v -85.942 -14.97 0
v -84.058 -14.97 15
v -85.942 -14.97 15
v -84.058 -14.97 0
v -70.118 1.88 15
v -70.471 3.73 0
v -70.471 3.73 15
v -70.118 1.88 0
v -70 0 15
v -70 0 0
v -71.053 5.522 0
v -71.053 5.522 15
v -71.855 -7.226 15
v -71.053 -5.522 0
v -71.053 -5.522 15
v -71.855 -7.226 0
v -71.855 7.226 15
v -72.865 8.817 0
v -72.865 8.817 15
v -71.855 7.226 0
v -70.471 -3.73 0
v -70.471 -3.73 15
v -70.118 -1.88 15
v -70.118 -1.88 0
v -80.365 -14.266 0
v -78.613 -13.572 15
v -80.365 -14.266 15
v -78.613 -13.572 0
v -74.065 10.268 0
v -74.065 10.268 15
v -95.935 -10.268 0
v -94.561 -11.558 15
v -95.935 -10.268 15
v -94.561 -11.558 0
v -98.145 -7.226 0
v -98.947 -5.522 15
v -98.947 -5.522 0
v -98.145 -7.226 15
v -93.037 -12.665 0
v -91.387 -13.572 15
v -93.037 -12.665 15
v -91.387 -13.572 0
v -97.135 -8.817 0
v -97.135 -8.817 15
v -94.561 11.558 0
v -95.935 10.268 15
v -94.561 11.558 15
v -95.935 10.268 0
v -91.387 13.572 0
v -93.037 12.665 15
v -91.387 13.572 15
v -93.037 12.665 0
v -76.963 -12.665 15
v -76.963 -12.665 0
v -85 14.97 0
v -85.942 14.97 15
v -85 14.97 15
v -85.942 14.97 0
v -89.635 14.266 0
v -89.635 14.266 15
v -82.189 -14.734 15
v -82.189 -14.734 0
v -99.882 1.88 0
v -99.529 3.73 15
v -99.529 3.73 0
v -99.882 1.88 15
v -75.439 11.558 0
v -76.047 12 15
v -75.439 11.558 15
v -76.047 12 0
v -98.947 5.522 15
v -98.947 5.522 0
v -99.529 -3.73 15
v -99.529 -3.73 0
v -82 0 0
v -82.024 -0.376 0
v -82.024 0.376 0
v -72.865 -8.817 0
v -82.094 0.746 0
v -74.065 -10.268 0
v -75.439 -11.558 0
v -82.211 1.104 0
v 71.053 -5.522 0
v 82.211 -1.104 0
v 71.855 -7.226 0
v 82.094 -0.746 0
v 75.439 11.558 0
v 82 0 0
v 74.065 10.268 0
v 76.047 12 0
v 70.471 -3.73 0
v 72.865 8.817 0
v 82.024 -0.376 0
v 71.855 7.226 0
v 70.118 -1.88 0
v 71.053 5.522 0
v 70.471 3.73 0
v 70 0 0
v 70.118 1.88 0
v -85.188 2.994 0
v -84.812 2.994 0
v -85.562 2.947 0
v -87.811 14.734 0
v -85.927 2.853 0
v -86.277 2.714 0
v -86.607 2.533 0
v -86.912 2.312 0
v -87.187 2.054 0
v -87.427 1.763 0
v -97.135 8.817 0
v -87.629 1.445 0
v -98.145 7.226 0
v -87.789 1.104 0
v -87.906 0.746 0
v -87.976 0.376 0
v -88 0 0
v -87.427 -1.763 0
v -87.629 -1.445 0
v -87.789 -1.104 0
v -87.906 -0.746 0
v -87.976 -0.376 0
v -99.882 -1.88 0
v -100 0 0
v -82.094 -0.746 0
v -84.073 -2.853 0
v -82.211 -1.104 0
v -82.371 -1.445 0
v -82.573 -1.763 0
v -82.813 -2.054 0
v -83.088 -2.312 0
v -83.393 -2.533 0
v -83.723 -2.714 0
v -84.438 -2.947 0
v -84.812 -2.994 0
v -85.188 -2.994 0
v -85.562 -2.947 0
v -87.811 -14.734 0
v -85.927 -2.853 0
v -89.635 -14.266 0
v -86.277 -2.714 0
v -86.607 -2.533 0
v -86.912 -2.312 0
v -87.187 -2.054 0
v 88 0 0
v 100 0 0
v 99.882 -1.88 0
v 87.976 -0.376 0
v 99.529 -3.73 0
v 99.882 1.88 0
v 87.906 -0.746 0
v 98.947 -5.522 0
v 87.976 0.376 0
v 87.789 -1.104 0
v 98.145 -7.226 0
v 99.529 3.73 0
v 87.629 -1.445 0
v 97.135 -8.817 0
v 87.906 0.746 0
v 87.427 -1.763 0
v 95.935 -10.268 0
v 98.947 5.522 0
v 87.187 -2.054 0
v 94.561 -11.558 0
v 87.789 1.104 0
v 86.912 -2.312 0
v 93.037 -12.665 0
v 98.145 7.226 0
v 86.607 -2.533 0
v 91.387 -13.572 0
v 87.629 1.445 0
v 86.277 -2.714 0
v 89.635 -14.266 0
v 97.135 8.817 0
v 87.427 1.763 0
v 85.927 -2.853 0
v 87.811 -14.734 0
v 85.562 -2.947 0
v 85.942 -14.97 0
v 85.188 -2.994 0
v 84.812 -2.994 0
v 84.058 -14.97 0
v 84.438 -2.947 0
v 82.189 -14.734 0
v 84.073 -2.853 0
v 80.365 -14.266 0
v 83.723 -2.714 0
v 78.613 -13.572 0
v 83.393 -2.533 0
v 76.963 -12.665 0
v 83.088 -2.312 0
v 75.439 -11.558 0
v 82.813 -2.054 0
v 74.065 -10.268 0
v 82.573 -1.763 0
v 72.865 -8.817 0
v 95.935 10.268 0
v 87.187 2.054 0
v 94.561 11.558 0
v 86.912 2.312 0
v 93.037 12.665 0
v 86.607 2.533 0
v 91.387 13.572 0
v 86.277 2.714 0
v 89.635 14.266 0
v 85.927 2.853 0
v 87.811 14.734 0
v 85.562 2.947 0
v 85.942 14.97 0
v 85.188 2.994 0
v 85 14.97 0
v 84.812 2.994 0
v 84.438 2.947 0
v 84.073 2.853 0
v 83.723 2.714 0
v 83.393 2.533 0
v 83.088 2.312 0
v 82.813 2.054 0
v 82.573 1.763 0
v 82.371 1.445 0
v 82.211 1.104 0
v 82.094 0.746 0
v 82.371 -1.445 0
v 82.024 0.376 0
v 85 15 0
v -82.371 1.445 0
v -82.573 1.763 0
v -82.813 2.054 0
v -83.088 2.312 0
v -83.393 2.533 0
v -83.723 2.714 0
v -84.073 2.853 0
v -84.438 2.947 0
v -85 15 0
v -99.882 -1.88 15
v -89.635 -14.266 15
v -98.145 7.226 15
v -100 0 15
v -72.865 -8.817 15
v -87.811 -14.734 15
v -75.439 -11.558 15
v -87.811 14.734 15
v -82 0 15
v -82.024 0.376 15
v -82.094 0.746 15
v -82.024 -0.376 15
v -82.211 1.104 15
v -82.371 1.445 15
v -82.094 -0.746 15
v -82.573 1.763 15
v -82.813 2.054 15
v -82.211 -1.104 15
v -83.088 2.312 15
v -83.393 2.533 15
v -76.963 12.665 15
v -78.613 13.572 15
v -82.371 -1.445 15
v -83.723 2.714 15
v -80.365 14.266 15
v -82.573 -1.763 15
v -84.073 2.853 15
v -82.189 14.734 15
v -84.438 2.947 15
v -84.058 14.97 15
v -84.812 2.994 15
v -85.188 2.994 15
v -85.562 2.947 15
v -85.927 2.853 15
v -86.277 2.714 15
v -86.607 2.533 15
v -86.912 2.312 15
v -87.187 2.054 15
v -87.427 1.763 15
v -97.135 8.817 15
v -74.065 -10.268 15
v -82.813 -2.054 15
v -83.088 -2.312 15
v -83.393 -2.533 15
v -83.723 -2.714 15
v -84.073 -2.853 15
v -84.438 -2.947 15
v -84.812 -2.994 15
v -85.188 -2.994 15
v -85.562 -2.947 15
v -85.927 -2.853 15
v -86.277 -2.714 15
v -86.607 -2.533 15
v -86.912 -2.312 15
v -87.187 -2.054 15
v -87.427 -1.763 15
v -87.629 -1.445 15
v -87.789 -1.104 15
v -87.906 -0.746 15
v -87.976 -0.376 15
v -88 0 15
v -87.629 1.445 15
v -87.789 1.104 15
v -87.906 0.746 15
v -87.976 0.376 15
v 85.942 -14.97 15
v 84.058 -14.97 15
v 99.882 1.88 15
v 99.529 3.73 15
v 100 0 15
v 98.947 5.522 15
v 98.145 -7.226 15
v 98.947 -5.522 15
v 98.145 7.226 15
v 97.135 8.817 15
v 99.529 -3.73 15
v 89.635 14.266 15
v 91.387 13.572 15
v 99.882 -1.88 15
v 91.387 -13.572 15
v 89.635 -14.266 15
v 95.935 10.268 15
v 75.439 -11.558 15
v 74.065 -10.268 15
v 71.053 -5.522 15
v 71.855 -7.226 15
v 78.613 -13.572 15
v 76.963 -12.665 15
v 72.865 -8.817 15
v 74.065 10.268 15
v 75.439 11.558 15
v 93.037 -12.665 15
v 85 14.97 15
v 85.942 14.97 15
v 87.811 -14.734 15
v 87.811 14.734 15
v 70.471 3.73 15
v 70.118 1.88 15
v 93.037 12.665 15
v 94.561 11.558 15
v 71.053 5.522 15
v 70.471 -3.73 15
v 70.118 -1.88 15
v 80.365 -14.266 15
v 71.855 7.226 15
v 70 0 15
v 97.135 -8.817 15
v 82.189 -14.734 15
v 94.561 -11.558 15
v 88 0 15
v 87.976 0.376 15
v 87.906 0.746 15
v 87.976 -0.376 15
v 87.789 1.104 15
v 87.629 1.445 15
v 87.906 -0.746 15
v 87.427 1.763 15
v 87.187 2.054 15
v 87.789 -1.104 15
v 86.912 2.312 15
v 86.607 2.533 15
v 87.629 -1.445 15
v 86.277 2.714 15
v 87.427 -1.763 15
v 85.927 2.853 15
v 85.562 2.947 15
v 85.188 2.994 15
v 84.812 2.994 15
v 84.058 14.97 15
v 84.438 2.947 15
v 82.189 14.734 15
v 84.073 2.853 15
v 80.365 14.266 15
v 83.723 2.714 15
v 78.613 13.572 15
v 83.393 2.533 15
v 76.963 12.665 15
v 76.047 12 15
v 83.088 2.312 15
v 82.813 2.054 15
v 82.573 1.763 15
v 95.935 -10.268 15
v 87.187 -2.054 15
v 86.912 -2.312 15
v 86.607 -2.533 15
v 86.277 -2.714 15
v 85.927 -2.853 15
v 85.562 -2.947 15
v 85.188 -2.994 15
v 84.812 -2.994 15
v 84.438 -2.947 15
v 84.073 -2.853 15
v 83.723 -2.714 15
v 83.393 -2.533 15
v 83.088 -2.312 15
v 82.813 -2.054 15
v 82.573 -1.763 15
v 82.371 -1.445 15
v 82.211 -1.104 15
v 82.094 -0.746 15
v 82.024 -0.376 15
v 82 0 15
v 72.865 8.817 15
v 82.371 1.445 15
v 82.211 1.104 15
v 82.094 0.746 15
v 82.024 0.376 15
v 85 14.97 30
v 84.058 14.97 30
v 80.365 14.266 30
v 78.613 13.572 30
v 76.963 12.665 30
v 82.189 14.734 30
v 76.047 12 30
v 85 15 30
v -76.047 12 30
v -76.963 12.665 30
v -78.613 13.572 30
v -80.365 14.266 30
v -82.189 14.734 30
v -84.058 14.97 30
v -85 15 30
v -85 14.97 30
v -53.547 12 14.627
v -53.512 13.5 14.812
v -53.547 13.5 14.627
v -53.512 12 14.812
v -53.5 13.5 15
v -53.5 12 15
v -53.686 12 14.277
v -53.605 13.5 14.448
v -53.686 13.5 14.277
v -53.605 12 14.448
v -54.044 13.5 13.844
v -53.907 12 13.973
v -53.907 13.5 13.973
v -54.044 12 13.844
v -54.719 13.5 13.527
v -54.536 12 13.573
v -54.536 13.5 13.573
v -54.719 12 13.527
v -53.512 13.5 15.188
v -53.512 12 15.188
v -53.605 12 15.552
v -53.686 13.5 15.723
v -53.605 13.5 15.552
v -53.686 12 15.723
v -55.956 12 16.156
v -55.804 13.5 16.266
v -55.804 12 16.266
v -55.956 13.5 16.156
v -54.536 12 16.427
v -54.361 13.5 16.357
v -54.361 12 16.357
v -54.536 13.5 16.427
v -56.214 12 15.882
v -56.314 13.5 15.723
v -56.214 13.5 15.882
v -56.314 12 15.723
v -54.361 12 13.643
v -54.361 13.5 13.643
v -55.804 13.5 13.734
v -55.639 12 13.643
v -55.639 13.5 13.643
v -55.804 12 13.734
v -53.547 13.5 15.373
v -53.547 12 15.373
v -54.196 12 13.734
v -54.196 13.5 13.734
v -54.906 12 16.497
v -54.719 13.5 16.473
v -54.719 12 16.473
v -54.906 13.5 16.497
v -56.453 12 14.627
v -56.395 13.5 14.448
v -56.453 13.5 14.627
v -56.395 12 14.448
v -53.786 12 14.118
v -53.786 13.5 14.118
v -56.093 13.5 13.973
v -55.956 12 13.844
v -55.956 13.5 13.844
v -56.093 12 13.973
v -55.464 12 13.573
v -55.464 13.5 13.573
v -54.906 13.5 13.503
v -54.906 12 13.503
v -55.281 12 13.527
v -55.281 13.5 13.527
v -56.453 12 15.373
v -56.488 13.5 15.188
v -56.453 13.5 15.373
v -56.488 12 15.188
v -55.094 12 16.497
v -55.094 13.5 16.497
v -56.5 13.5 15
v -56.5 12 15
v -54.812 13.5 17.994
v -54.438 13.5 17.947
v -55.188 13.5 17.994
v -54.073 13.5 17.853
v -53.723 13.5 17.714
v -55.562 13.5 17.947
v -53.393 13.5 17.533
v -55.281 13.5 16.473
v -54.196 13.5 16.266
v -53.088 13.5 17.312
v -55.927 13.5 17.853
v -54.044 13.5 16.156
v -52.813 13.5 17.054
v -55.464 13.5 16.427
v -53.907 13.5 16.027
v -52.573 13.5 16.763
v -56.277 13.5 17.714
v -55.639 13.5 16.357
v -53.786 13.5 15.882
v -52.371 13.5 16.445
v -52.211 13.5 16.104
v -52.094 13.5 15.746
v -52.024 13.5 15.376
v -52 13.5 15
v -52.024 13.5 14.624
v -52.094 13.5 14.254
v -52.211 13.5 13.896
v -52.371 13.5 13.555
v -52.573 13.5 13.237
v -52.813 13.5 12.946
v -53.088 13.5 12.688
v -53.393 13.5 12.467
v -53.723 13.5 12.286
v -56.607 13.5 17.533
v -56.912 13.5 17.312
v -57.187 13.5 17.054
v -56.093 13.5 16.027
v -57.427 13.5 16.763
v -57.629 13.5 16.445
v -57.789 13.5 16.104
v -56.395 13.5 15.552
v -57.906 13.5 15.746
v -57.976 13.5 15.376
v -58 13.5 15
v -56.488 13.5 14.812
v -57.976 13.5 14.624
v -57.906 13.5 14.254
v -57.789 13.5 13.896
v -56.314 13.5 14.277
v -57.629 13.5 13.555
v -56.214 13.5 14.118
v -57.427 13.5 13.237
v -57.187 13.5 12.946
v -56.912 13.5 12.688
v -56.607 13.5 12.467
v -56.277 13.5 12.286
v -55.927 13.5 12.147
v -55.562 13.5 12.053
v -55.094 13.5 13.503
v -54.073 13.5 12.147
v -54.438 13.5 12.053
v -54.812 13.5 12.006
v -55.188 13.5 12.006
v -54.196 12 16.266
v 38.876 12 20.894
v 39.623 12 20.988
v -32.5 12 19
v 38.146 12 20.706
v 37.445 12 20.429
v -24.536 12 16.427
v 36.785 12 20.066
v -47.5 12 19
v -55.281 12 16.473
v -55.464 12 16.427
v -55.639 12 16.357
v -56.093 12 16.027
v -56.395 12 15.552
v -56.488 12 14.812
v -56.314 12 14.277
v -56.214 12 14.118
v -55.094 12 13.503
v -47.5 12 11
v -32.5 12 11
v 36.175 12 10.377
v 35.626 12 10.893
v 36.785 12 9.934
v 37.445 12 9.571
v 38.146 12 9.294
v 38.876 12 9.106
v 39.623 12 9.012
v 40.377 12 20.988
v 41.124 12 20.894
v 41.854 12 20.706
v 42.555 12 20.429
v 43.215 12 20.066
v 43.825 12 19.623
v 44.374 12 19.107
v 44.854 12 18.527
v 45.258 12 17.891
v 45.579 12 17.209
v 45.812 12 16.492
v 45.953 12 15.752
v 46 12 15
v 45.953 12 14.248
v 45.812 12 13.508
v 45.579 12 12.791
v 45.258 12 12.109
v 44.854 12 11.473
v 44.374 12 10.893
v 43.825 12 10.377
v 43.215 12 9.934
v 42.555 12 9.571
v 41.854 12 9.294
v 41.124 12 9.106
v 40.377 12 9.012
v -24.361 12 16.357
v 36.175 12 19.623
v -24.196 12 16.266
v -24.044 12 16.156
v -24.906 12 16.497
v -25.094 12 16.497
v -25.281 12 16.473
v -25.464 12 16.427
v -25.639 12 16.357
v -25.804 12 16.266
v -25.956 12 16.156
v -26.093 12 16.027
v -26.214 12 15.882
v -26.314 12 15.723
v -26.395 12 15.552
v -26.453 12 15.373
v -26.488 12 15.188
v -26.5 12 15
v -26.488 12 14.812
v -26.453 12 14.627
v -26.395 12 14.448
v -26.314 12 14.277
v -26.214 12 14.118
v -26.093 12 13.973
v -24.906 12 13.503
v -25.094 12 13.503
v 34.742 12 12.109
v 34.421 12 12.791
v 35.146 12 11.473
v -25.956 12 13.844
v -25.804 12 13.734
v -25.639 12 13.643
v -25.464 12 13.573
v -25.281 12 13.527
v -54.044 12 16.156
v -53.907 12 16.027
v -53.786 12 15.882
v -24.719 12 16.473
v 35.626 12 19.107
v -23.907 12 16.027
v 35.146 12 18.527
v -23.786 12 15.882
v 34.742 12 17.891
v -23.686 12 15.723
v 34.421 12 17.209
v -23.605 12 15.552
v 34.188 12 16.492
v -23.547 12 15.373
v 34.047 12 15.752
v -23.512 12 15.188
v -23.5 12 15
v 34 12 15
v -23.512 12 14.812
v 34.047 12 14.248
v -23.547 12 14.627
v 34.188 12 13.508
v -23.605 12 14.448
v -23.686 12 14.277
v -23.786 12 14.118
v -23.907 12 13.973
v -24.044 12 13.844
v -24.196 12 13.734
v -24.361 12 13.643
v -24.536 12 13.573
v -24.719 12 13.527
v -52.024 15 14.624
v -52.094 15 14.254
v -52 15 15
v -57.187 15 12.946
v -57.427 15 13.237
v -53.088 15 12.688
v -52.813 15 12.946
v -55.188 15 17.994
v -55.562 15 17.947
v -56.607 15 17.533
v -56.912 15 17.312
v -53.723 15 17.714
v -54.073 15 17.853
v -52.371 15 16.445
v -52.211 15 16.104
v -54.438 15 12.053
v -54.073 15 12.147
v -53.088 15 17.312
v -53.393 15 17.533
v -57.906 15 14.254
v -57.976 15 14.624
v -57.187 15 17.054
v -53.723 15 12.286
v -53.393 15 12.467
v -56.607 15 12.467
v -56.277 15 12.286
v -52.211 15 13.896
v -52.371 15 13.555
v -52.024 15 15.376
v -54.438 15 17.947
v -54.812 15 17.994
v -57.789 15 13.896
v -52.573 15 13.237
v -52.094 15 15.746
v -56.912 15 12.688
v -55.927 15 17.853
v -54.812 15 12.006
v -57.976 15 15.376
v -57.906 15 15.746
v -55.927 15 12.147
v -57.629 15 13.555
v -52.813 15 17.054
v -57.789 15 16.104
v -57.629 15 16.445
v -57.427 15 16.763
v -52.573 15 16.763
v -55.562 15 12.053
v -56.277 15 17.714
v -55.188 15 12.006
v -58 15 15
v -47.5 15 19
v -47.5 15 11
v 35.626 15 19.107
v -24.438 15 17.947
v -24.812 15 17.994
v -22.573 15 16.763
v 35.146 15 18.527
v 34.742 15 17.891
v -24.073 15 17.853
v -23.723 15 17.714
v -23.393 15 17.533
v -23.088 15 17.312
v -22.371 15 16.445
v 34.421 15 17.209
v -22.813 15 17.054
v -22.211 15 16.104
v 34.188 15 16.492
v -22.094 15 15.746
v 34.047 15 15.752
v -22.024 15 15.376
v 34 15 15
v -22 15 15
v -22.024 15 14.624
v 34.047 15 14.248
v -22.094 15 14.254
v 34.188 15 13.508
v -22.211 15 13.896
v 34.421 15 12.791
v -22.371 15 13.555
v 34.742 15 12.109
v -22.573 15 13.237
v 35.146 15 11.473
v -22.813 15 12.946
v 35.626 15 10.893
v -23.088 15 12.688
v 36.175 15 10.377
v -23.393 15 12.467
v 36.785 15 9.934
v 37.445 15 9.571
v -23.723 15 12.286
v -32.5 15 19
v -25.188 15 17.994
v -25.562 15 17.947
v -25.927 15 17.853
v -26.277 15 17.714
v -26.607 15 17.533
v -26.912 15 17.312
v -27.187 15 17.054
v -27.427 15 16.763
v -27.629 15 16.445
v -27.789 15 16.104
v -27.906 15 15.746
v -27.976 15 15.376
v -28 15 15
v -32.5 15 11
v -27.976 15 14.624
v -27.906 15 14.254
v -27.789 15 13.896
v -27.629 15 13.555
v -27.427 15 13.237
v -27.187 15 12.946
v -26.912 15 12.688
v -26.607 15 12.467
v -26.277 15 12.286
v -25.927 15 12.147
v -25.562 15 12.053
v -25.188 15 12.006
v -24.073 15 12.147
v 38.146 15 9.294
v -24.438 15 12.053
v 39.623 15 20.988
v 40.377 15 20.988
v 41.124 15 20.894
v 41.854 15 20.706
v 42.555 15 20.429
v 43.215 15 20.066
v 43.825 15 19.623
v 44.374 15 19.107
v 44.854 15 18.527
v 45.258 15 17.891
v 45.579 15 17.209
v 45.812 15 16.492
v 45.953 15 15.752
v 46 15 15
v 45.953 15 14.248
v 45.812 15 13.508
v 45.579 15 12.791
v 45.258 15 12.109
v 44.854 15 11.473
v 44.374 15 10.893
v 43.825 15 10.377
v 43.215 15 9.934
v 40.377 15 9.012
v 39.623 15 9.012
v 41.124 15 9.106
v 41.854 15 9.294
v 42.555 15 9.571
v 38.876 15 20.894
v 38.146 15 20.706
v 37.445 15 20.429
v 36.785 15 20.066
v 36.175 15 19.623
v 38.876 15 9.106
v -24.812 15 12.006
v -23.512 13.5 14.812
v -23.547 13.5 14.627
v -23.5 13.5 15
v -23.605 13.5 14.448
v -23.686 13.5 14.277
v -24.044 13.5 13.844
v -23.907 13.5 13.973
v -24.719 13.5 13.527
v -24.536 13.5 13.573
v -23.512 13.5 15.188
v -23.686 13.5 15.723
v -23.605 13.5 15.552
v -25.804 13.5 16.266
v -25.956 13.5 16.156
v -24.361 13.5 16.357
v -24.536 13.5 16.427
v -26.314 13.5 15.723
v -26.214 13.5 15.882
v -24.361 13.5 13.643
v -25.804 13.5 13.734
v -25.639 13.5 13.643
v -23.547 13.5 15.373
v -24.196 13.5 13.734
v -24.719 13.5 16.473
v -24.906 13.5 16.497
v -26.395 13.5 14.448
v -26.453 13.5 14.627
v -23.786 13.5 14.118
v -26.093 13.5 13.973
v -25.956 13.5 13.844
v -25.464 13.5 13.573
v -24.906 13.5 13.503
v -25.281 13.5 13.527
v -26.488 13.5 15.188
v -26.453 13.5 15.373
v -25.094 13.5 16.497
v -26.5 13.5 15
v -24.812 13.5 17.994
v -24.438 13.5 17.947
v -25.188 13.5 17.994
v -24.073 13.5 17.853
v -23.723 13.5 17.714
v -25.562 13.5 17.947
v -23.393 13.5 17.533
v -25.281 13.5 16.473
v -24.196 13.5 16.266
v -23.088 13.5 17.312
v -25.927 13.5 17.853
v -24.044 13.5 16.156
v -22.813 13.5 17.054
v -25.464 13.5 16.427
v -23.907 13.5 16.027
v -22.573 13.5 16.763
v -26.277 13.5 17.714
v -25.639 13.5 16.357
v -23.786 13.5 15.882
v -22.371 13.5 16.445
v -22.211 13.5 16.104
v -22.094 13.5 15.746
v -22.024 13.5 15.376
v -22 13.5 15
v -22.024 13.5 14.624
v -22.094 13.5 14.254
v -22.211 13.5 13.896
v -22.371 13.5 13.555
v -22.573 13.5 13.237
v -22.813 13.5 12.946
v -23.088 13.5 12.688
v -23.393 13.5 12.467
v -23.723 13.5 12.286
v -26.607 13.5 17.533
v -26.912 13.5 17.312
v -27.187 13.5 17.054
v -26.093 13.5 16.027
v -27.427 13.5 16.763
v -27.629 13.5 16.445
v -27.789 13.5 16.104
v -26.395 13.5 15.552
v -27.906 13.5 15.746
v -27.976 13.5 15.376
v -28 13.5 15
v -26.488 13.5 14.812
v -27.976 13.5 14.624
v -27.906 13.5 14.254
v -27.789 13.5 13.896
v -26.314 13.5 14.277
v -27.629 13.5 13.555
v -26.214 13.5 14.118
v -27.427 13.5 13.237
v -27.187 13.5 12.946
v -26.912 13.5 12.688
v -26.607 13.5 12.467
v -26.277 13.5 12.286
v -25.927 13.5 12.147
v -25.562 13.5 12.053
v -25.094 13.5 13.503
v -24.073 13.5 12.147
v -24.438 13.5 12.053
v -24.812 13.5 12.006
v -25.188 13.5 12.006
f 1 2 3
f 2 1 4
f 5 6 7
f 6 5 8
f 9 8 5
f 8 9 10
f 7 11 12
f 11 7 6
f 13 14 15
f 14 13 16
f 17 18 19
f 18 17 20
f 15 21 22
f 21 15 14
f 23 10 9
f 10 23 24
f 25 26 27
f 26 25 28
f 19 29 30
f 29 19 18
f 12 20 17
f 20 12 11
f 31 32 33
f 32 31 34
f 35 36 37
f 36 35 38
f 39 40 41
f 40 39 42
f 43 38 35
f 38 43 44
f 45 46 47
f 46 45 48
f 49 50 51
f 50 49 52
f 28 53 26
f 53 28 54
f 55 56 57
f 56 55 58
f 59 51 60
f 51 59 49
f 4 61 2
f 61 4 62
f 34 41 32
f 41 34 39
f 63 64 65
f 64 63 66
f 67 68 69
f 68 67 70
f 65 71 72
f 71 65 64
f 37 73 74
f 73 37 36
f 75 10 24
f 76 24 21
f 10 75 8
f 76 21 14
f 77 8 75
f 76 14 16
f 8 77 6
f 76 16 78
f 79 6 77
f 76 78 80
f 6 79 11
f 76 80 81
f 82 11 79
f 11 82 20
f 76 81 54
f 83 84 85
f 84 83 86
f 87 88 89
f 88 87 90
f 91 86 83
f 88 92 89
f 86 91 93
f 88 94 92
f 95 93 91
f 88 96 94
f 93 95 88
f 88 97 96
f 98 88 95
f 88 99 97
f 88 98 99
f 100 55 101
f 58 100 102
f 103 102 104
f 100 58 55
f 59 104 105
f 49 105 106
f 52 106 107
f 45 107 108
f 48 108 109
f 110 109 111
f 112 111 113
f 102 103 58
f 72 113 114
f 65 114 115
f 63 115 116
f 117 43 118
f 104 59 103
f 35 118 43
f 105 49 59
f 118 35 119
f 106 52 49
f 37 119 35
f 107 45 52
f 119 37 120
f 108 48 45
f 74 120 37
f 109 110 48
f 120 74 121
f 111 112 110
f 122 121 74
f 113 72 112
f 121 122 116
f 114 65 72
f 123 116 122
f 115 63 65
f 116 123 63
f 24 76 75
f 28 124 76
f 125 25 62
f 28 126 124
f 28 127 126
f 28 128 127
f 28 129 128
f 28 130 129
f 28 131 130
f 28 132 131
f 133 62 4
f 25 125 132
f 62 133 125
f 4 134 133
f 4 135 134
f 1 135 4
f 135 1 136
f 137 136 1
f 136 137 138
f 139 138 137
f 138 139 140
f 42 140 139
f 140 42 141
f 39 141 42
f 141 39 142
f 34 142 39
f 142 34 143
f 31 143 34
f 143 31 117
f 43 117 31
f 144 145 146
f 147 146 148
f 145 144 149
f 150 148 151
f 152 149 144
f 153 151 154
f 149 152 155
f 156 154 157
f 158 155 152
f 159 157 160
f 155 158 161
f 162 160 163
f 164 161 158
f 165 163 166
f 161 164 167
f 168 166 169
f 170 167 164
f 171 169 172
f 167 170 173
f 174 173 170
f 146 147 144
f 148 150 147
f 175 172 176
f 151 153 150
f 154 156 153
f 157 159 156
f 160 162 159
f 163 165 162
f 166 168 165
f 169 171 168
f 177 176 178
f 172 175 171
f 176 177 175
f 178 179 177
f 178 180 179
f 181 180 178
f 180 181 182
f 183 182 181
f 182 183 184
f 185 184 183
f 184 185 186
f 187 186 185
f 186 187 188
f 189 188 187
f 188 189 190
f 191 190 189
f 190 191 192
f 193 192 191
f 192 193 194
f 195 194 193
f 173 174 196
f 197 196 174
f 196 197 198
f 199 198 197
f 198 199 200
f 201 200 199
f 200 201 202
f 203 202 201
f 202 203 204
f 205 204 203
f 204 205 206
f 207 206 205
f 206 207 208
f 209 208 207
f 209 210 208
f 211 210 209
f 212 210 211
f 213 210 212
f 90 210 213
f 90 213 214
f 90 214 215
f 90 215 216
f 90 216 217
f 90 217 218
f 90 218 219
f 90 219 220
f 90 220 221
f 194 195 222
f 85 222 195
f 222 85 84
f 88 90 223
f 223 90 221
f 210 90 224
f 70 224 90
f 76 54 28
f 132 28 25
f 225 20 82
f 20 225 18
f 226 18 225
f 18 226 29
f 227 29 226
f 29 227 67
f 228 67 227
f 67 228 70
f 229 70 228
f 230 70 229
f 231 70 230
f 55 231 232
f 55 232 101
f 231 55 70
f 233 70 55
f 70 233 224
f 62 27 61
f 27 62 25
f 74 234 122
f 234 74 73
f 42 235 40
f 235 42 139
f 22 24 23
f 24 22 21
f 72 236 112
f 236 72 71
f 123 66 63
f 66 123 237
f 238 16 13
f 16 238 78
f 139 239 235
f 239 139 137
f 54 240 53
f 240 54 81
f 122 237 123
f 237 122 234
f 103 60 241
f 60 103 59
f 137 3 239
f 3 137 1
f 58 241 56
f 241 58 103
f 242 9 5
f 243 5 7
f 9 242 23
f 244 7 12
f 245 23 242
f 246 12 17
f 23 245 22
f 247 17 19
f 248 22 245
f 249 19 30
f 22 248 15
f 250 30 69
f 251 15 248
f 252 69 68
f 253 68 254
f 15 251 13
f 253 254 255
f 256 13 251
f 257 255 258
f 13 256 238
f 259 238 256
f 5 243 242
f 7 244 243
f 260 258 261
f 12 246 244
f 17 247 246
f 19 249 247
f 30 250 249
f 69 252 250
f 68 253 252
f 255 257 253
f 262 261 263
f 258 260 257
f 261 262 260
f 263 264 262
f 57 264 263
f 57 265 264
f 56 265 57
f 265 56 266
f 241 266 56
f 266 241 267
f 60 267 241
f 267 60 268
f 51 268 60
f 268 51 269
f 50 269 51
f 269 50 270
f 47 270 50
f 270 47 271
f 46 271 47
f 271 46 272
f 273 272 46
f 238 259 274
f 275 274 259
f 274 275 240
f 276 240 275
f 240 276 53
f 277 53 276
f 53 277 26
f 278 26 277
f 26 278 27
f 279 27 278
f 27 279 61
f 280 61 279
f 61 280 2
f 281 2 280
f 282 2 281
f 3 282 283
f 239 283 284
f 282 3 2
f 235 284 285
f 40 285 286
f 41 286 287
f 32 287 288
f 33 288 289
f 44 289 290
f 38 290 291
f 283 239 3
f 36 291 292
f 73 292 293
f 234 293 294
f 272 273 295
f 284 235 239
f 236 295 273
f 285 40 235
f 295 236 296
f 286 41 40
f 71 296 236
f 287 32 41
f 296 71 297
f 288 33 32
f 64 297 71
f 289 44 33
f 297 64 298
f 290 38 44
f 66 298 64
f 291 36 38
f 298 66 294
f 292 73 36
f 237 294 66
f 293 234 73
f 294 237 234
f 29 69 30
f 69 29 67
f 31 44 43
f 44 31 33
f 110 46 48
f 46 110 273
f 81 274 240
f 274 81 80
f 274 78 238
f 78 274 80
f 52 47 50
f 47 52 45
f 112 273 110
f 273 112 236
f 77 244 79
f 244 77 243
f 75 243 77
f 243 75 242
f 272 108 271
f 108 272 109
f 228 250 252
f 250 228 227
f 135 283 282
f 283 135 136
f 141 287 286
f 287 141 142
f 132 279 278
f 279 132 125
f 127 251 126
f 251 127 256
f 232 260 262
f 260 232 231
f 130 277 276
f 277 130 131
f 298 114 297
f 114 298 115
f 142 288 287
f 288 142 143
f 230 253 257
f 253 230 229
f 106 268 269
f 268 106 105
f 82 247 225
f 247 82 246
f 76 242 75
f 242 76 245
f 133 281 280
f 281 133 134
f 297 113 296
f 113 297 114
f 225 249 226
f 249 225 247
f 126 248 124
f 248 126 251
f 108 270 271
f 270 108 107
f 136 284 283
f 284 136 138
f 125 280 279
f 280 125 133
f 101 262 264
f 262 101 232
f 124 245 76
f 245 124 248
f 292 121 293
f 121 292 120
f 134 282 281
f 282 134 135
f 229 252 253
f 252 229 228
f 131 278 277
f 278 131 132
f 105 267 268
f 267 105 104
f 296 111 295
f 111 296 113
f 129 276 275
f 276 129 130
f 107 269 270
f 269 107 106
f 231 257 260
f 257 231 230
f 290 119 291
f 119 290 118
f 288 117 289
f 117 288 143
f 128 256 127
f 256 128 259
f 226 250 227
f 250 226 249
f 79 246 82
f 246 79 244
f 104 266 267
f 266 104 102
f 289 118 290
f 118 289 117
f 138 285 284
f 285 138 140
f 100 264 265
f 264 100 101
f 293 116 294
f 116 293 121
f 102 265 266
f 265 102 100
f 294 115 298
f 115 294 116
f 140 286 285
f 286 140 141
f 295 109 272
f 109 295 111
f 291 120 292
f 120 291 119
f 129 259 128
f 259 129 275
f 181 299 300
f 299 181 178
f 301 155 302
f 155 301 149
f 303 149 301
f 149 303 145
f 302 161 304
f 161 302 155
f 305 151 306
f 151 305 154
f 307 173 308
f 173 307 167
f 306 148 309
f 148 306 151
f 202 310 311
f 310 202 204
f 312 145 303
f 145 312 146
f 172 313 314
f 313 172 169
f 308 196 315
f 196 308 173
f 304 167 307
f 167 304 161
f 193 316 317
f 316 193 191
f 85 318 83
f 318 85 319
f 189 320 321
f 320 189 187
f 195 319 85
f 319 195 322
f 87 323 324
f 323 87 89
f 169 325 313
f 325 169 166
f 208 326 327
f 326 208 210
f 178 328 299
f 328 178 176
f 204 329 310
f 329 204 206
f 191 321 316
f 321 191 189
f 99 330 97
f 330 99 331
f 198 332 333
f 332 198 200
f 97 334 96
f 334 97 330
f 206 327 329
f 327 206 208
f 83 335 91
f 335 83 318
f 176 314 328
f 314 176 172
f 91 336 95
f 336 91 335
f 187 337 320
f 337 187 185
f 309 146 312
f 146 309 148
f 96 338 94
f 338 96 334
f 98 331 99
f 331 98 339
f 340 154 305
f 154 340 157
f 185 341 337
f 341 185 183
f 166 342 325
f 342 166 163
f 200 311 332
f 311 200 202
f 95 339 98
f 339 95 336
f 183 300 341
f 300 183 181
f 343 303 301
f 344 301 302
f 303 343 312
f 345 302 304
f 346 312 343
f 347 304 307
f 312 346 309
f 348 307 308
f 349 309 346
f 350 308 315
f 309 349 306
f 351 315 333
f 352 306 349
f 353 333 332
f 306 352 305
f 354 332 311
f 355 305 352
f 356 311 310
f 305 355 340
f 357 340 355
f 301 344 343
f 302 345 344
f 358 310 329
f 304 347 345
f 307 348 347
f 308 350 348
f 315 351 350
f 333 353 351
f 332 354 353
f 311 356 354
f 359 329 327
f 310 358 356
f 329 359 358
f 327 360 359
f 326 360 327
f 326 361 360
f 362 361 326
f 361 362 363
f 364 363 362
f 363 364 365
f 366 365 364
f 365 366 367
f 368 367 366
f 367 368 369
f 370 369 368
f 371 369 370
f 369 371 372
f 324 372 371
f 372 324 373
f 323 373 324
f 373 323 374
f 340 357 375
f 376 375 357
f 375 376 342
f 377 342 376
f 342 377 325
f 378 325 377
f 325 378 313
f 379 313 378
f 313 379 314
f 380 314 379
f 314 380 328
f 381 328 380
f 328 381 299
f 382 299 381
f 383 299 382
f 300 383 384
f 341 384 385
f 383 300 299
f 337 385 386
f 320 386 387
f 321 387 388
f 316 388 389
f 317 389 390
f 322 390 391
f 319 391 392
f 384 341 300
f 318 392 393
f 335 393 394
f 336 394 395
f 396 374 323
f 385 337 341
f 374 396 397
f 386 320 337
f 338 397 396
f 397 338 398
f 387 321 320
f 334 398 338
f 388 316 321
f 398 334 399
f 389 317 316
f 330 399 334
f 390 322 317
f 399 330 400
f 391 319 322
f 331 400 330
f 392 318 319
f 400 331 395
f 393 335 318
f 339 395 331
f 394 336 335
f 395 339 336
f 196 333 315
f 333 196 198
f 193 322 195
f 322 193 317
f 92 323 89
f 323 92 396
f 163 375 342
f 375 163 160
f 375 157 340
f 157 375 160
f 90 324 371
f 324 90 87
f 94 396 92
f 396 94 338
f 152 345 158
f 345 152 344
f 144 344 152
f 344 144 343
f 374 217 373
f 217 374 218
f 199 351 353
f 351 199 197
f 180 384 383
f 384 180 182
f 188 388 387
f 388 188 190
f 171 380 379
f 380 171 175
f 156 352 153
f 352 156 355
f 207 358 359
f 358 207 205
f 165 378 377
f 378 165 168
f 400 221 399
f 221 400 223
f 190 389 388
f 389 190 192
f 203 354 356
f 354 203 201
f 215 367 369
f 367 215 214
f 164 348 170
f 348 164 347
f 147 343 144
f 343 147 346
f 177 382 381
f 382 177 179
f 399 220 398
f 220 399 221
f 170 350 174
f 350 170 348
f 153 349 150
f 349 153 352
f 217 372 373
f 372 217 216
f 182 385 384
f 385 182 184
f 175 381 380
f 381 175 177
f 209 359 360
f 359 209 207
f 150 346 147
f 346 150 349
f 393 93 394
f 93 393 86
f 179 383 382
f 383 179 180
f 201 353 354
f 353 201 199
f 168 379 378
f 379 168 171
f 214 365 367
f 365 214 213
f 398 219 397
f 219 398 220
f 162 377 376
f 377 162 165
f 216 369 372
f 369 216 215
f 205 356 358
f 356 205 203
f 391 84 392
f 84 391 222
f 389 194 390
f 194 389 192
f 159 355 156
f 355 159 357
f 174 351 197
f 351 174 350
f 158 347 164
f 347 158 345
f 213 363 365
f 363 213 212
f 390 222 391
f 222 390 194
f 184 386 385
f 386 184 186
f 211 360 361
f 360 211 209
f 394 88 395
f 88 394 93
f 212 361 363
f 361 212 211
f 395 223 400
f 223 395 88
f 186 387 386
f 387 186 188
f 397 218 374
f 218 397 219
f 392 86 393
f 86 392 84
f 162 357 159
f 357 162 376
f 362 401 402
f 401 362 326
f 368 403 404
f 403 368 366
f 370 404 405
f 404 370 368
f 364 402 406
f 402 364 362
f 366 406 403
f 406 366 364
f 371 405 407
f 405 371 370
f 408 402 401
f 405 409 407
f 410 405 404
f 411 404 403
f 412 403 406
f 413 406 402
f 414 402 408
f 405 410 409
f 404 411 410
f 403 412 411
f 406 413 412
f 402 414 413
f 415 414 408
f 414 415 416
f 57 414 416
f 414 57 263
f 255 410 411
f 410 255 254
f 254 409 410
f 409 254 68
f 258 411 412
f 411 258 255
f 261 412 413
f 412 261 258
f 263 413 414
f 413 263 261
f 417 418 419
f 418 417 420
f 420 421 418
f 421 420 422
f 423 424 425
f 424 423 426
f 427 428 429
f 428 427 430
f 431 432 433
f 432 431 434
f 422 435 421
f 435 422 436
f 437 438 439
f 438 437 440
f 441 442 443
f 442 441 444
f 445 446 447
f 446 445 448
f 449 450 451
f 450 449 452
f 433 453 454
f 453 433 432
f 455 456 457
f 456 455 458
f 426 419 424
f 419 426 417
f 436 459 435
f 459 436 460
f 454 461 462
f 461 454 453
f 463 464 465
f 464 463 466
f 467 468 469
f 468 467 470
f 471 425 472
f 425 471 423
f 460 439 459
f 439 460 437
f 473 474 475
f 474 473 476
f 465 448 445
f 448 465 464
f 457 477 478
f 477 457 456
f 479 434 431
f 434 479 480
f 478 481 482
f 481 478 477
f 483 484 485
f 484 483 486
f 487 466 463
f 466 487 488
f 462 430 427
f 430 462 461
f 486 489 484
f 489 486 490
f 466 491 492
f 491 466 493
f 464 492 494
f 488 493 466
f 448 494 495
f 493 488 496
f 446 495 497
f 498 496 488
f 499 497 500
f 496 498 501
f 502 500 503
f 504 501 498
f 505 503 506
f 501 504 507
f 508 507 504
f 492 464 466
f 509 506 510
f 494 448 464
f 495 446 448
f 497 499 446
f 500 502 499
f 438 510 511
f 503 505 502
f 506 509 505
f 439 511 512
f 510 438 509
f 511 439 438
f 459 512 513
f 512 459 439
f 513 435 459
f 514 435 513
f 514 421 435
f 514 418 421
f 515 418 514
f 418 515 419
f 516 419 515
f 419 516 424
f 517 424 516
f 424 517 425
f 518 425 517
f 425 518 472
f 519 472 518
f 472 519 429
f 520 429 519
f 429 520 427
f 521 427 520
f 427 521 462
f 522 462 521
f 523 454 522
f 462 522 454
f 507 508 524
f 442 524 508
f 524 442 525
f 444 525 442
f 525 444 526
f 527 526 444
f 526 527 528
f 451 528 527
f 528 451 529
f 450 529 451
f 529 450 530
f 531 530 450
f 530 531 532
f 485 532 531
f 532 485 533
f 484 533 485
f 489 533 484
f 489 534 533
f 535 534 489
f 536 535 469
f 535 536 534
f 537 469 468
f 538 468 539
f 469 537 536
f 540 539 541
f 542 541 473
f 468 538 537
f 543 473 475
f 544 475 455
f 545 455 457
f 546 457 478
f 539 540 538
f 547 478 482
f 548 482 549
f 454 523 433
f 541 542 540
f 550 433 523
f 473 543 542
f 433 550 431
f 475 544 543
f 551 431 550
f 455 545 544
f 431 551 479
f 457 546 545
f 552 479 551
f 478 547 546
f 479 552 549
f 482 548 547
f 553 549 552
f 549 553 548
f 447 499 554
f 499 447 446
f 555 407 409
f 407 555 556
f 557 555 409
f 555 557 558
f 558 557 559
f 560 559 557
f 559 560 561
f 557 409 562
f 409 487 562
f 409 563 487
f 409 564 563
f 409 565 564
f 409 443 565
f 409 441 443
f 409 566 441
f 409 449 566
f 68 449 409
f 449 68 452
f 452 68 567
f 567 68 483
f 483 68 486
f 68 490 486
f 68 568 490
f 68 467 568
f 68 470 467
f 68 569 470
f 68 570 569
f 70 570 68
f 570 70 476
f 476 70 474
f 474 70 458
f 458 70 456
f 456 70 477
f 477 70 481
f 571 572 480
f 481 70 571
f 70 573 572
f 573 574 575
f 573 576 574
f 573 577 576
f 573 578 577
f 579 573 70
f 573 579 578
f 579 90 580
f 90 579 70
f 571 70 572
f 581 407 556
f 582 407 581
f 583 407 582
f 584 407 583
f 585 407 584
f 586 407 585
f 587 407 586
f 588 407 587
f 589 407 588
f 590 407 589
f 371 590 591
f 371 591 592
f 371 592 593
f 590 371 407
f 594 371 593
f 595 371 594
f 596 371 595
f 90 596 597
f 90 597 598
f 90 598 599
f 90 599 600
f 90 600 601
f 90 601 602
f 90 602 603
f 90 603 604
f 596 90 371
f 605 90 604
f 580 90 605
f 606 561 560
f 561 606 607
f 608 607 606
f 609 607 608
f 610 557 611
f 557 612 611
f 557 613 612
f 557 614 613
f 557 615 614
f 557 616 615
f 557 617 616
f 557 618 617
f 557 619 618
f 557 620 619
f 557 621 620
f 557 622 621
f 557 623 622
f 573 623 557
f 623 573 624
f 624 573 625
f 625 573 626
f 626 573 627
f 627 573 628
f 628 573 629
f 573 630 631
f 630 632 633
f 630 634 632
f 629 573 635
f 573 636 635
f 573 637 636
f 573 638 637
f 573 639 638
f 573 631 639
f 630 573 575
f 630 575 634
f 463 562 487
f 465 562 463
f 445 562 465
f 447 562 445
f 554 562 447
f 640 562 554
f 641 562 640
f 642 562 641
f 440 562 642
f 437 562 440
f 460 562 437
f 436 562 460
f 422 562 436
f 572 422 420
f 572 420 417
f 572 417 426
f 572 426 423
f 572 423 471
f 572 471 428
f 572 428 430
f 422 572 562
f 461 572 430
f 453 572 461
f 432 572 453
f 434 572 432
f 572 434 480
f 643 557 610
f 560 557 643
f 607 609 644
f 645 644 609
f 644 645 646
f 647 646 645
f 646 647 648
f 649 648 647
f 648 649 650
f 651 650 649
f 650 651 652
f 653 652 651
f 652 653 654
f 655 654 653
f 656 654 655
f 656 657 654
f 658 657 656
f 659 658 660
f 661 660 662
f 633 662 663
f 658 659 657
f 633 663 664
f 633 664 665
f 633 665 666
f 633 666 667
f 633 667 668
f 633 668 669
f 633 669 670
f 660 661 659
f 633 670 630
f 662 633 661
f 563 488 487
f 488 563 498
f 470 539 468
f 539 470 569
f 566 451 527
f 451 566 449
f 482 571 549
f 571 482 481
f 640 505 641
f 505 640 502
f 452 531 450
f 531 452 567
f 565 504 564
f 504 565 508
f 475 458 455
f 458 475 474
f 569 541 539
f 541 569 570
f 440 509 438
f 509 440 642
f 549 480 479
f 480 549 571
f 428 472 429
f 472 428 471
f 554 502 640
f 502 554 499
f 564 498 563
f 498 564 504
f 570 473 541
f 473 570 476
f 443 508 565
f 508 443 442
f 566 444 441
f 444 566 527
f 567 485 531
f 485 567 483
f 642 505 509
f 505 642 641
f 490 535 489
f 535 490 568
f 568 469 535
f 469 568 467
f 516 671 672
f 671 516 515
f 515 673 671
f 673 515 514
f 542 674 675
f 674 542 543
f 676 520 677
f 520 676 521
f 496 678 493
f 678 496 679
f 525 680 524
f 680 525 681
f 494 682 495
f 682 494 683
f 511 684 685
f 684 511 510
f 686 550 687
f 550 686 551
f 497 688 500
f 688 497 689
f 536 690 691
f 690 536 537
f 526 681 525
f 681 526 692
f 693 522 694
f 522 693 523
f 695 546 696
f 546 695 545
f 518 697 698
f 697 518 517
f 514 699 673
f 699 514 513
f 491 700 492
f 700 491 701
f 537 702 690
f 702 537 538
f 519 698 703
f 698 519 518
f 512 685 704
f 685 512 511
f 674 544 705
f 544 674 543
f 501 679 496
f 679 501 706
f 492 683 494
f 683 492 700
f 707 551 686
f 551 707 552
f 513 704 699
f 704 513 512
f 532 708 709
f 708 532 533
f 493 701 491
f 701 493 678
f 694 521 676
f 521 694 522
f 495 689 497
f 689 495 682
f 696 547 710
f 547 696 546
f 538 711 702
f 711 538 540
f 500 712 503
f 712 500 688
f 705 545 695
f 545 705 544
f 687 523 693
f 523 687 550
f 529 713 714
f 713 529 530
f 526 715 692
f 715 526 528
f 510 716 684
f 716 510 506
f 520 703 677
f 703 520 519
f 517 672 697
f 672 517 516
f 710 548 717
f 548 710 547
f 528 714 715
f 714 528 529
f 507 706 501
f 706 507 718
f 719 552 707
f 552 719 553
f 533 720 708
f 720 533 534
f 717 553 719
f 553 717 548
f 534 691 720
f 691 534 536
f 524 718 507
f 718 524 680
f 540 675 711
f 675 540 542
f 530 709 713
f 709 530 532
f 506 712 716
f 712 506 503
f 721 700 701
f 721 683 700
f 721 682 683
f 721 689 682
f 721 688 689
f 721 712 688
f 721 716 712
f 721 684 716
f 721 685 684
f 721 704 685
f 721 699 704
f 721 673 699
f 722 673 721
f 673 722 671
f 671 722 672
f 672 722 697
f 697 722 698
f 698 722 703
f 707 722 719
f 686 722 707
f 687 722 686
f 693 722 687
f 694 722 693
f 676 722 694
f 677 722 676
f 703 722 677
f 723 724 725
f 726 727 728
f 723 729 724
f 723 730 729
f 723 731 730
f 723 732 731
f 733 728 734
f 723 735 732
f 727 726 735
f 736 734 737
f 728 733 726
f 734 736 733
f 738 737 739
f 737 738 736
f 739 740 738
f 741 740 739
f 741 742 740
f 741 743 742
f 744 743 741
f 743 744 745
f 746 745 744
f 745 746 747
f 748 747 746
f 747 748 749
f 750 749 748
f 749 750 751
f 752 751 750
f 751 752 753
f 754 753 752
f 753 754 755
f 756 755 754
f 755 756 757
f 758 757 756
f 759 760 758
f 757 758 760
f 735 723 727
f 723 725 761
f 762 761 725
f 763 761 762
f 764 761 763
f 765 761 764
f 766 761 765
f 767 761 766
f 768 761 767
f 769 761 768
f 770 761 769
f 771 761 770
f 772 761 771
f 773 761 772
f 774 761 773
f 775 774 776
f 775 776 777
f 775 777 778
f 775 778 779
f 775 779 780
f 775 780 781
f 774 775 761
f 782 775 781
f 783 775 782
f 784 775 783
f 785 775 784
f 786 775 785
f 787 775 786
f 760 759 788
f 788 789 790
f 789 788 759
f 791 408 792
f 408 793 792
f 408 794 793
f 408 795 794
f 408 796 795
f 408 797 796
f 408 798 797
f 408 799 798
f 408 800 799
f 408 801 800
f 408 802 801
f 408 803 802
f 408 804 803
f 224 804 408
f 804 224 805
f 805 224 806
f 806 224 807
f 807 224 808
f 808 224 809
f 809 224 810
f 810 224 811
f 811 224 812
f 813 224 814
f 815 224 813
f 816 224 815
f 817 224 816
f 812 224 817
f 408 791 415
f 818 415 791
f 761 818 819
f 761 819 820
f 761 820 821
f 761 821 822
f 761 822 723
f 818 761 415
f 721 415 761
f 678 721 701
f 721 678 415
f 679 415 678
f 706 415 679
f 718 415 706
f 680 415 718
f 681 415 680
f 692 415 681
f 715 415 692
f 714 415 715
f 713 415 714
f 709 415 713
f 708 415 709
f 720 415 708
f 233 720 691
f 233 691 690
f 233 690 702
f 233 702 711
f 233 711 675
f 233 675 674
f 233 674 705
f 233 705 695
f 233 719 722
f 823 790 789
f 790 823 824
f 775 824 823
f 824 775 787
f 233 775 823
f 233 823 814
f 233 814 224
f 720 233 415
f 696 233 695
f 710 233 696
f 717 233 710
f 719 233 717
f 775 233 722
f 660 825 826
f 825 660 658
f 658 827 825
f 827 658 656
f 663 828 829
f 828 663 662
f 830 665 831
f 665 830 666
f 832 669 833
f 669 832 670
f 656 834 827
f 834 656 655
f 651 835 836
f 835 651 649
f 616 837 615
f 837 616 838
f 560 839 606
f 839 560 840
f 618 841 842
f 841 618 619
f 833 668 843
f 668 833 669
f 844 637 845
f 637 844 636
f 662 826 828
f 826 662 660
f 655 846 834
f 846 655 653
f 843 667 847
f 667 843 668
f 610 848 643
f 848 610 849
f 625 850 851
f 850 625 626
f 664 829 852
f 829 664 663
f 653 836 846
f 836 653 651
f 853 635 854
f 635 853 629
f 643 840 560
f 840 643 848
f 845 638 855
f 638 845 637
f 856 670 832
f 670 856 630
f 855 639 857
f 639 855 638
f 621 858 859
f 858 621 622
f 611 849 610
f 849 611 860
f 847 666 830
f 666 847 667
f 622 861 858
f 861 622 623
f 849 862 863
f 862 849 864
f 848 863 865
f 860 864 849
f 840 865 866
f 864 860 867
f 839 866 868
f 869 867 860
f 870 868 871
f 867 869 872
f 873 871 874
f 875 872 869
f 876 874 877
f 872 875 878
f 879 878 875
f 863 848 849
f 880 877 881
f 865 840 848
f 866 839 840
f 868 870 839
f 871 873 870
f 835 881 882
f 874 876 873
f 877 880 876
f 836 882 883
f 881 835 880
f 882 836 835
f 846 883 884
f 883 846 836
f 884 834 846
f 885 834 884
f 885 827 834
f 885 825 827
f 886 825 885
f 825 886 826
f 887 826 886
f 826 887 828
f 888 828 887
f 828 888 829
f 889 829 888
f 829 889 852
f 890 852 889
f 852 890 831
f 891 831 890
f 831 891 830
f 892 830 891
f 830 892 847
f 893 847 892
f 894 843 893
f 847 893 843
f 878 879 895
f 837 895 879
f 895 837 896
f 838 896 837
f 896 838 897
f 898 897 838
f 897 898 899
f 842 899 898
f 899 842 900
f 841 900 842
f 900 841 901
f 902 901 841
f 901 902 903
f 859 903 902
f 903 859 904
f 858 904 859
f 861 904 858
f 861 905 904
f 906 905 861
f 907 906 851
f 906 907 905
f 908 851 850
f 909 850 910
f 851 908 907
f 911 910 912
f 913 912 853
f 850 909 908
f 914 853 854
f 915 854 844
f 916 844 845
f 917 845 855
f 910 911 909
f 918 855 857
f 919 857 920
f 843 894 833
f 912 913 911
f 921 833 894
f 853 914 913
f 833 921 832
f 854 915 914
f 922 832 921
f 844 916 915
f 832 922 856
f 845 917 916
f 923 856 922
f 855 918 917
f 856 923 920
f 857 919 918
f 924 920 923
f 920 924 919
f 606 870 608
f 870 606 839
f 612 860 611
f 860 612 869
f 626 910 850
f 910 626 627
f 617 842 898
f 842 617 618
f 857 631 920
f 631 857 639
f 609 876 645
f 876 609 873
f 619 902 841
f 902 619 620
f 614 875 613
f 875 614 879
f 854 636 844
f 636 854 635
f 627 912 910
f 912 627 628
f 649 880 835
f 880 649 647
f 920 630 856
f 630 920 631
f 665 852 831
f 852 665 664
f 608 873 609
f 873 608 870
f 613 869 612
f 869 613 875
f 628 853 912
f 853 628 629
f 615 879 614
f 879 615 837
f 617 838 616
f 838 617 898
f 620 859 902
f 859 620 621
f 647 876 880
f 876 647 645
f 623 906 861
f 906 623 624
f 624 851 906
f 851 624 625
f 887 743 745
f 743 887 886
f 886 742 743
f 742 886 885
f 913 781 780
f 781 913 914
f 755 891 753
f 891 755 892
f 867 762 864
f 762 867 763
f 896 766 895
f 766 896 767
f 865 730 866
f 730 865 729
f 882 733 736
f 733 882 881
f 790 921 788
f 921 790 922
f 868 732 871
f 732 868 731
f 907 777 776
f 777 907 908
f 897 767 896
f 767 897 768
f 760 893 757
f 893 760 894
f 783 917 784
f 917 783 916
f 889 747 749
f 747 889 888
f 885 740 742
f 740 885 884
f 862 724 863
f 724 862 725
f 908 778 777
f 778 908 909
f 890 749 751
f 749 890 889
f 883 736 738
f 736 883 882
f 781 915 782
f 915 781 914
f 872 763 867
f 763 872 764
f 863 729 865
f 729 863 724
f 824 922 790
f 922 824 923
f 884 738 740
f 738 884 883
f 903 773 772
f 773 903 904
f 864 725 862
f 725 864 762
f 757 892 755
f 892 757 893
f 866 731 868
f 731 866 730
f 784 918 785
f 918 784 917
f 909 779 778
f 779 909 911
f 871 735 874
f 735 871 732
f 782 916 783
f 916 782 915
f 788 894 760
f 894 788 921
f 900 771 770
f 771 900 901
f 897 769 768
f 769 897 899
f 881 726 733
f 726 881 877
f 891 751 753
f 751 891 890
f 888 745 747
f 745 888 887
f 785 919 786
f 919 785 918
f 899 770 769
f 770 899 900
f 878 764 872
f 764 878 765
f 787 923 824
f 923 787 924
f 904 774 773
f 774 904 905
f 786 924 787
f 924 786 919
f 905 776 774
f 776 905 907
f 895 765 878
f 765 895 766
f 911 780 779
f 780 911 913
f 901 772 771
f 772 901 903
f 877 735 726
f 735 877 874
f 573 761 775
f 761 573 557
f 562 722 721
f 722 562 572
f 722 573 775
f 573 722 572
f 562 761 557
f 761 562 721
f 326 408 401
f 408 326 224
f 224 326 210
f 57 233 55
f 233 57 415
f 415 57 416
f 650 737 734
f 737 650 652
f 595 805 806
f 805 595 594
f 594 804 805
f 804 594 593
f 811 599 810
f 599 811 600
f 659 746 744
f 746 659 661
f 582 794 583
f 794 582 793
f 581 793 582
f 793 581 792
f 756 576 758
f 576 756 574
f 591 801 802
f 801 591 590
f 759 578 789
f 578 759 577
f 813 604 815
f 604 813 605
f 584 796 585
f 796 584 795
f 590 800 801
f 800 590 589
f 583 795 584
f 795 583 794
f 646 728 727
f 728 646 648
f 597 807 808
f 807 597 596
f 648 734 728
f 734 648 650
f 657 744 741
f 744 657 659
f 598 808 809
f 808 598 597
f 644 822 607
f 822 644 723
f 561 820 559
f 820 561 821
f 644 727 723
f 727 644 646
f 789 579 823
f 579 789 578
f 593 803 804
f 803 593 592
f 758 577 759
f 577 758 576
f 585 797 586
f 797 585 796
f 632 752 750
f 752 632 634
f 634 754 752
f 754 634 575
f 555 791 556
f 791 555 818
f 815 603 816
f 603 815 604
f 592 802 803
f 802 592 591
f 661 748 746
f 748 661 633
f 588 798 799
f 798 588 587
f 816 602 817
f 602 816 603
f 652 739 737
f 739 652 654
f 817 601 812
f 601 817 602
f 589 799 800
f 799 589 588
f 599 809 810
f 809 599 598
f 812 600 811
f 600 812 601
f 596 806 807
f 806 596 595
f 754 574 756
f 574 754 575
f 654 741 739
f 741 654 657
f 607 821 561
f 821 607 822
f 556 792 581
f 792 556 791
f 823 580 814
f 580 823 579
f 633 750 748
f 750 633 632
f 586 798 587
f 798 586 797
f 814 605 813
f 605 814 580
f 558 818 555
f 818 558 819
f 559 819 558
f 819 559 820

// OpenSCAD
FEET_BOLT_DIA = 6;
CORNER_DIA = 30;
WIDTH = 200;
HEIGHT = 30;
THICKNESS = 3;

USB = true;
USB_SLOT_WIDTH = 15;
USB_SLOT_HEIGHT = 8;
USB_MOUNTING_HOLES_DIA = 3;
USB_MOUNTING_HOLES_HEAD_DIA = 2 * USB_MOUNTING_HOLES_DIA;
USB_MOUNTING_HOLES_SPACING = 30;

ONOFF = false;

ONOFF_SLOT_WIDTH = 19;
ONOFF_SLOT_HEIGHT = 13;

ONOFF_ROUND = true;
ONOFF_HOLE_DIA = 12;

$fn = 50;

module standoffs() {
    translate([-(WIDTH-CORNER_DIA)/2, 0, 0])
    difference() {
        cylinder(d = CORNER_DIA, h = HEIGHT/2);
        cylinder(d = FEET_BOLT_DIA, h = HEIGHT/2);
    }

    translate([(WIDTH-CORNER_DIA)/2, 0, 0])
    difference() {
        cylinder(d = CORNER_DIA, h = HEIGHT/2);
        cylinder(d = FEET_BOLT_DIA, h = HEIGHT/2);
    }
}

module usb() {
    union() {
        for(i = [-1, 1]) {
            translate([i * USB_MOUNTING_HOLES_SPACING/2, 0, 0])
            union() {
                cylinder(d = USB_MOUNTING_HOLES_DIA, h = THICKNESS/2);
                translate([0, 0, THICKNESS/2])
                cylinder(d = USB_MOUNTING_HOLES_HEAD_DIA, h = THICKNESS/2);
            }
        }

        cube(size = [USB_SLOT_WIDTH, USB_SLOT_HEIGHT, THICKNESS*2], center = true);
    }
}

module onoff() {
    cube(size = [ONOFF_SLOT_WIDTH, ONOFF_SLOT_HEIGHT, THICKNESS*2], center = true);
}

module onoff_round() {
    cylinder(d = ONOFF_HOLE_DIA, h = THICKNESS * 2, center = true);
}


union() {
    standoffs();
    difference() {
        translate([-(WIDTH-CORNER_DIA)/2, CORNER_DIA/2 - THICKNESS, 0])
        cube(size = [(WIDTH-CORNER_DIA), THICKNESS, HEIGHT]);
        translate([0, 0, HEIGHT/2])
        rotate([0, 0, 180])
        standoffs();

        if (USB) {
            translate([-WIDTH/5, CORNER_DIA/2 - THICKNESS, HEIGHT/2])
            rotate([-90, 0, 0])
            usb();
        }

        if (ONOFF) {
            translate([WIDTH/5, CORNER_DIA/2 - THICKNESS, HEIGHT/2])
            rotate([-90, 0, 0])
            onoff();
        }

        if (ONOFF_ROUND) {
            translate([WIDTH/5, CORNER_DIA/2 - THICKNESS, HEIGHT/2])
            rotate([-90, 0, 0])
            onoff_round();
        }
    }
}
